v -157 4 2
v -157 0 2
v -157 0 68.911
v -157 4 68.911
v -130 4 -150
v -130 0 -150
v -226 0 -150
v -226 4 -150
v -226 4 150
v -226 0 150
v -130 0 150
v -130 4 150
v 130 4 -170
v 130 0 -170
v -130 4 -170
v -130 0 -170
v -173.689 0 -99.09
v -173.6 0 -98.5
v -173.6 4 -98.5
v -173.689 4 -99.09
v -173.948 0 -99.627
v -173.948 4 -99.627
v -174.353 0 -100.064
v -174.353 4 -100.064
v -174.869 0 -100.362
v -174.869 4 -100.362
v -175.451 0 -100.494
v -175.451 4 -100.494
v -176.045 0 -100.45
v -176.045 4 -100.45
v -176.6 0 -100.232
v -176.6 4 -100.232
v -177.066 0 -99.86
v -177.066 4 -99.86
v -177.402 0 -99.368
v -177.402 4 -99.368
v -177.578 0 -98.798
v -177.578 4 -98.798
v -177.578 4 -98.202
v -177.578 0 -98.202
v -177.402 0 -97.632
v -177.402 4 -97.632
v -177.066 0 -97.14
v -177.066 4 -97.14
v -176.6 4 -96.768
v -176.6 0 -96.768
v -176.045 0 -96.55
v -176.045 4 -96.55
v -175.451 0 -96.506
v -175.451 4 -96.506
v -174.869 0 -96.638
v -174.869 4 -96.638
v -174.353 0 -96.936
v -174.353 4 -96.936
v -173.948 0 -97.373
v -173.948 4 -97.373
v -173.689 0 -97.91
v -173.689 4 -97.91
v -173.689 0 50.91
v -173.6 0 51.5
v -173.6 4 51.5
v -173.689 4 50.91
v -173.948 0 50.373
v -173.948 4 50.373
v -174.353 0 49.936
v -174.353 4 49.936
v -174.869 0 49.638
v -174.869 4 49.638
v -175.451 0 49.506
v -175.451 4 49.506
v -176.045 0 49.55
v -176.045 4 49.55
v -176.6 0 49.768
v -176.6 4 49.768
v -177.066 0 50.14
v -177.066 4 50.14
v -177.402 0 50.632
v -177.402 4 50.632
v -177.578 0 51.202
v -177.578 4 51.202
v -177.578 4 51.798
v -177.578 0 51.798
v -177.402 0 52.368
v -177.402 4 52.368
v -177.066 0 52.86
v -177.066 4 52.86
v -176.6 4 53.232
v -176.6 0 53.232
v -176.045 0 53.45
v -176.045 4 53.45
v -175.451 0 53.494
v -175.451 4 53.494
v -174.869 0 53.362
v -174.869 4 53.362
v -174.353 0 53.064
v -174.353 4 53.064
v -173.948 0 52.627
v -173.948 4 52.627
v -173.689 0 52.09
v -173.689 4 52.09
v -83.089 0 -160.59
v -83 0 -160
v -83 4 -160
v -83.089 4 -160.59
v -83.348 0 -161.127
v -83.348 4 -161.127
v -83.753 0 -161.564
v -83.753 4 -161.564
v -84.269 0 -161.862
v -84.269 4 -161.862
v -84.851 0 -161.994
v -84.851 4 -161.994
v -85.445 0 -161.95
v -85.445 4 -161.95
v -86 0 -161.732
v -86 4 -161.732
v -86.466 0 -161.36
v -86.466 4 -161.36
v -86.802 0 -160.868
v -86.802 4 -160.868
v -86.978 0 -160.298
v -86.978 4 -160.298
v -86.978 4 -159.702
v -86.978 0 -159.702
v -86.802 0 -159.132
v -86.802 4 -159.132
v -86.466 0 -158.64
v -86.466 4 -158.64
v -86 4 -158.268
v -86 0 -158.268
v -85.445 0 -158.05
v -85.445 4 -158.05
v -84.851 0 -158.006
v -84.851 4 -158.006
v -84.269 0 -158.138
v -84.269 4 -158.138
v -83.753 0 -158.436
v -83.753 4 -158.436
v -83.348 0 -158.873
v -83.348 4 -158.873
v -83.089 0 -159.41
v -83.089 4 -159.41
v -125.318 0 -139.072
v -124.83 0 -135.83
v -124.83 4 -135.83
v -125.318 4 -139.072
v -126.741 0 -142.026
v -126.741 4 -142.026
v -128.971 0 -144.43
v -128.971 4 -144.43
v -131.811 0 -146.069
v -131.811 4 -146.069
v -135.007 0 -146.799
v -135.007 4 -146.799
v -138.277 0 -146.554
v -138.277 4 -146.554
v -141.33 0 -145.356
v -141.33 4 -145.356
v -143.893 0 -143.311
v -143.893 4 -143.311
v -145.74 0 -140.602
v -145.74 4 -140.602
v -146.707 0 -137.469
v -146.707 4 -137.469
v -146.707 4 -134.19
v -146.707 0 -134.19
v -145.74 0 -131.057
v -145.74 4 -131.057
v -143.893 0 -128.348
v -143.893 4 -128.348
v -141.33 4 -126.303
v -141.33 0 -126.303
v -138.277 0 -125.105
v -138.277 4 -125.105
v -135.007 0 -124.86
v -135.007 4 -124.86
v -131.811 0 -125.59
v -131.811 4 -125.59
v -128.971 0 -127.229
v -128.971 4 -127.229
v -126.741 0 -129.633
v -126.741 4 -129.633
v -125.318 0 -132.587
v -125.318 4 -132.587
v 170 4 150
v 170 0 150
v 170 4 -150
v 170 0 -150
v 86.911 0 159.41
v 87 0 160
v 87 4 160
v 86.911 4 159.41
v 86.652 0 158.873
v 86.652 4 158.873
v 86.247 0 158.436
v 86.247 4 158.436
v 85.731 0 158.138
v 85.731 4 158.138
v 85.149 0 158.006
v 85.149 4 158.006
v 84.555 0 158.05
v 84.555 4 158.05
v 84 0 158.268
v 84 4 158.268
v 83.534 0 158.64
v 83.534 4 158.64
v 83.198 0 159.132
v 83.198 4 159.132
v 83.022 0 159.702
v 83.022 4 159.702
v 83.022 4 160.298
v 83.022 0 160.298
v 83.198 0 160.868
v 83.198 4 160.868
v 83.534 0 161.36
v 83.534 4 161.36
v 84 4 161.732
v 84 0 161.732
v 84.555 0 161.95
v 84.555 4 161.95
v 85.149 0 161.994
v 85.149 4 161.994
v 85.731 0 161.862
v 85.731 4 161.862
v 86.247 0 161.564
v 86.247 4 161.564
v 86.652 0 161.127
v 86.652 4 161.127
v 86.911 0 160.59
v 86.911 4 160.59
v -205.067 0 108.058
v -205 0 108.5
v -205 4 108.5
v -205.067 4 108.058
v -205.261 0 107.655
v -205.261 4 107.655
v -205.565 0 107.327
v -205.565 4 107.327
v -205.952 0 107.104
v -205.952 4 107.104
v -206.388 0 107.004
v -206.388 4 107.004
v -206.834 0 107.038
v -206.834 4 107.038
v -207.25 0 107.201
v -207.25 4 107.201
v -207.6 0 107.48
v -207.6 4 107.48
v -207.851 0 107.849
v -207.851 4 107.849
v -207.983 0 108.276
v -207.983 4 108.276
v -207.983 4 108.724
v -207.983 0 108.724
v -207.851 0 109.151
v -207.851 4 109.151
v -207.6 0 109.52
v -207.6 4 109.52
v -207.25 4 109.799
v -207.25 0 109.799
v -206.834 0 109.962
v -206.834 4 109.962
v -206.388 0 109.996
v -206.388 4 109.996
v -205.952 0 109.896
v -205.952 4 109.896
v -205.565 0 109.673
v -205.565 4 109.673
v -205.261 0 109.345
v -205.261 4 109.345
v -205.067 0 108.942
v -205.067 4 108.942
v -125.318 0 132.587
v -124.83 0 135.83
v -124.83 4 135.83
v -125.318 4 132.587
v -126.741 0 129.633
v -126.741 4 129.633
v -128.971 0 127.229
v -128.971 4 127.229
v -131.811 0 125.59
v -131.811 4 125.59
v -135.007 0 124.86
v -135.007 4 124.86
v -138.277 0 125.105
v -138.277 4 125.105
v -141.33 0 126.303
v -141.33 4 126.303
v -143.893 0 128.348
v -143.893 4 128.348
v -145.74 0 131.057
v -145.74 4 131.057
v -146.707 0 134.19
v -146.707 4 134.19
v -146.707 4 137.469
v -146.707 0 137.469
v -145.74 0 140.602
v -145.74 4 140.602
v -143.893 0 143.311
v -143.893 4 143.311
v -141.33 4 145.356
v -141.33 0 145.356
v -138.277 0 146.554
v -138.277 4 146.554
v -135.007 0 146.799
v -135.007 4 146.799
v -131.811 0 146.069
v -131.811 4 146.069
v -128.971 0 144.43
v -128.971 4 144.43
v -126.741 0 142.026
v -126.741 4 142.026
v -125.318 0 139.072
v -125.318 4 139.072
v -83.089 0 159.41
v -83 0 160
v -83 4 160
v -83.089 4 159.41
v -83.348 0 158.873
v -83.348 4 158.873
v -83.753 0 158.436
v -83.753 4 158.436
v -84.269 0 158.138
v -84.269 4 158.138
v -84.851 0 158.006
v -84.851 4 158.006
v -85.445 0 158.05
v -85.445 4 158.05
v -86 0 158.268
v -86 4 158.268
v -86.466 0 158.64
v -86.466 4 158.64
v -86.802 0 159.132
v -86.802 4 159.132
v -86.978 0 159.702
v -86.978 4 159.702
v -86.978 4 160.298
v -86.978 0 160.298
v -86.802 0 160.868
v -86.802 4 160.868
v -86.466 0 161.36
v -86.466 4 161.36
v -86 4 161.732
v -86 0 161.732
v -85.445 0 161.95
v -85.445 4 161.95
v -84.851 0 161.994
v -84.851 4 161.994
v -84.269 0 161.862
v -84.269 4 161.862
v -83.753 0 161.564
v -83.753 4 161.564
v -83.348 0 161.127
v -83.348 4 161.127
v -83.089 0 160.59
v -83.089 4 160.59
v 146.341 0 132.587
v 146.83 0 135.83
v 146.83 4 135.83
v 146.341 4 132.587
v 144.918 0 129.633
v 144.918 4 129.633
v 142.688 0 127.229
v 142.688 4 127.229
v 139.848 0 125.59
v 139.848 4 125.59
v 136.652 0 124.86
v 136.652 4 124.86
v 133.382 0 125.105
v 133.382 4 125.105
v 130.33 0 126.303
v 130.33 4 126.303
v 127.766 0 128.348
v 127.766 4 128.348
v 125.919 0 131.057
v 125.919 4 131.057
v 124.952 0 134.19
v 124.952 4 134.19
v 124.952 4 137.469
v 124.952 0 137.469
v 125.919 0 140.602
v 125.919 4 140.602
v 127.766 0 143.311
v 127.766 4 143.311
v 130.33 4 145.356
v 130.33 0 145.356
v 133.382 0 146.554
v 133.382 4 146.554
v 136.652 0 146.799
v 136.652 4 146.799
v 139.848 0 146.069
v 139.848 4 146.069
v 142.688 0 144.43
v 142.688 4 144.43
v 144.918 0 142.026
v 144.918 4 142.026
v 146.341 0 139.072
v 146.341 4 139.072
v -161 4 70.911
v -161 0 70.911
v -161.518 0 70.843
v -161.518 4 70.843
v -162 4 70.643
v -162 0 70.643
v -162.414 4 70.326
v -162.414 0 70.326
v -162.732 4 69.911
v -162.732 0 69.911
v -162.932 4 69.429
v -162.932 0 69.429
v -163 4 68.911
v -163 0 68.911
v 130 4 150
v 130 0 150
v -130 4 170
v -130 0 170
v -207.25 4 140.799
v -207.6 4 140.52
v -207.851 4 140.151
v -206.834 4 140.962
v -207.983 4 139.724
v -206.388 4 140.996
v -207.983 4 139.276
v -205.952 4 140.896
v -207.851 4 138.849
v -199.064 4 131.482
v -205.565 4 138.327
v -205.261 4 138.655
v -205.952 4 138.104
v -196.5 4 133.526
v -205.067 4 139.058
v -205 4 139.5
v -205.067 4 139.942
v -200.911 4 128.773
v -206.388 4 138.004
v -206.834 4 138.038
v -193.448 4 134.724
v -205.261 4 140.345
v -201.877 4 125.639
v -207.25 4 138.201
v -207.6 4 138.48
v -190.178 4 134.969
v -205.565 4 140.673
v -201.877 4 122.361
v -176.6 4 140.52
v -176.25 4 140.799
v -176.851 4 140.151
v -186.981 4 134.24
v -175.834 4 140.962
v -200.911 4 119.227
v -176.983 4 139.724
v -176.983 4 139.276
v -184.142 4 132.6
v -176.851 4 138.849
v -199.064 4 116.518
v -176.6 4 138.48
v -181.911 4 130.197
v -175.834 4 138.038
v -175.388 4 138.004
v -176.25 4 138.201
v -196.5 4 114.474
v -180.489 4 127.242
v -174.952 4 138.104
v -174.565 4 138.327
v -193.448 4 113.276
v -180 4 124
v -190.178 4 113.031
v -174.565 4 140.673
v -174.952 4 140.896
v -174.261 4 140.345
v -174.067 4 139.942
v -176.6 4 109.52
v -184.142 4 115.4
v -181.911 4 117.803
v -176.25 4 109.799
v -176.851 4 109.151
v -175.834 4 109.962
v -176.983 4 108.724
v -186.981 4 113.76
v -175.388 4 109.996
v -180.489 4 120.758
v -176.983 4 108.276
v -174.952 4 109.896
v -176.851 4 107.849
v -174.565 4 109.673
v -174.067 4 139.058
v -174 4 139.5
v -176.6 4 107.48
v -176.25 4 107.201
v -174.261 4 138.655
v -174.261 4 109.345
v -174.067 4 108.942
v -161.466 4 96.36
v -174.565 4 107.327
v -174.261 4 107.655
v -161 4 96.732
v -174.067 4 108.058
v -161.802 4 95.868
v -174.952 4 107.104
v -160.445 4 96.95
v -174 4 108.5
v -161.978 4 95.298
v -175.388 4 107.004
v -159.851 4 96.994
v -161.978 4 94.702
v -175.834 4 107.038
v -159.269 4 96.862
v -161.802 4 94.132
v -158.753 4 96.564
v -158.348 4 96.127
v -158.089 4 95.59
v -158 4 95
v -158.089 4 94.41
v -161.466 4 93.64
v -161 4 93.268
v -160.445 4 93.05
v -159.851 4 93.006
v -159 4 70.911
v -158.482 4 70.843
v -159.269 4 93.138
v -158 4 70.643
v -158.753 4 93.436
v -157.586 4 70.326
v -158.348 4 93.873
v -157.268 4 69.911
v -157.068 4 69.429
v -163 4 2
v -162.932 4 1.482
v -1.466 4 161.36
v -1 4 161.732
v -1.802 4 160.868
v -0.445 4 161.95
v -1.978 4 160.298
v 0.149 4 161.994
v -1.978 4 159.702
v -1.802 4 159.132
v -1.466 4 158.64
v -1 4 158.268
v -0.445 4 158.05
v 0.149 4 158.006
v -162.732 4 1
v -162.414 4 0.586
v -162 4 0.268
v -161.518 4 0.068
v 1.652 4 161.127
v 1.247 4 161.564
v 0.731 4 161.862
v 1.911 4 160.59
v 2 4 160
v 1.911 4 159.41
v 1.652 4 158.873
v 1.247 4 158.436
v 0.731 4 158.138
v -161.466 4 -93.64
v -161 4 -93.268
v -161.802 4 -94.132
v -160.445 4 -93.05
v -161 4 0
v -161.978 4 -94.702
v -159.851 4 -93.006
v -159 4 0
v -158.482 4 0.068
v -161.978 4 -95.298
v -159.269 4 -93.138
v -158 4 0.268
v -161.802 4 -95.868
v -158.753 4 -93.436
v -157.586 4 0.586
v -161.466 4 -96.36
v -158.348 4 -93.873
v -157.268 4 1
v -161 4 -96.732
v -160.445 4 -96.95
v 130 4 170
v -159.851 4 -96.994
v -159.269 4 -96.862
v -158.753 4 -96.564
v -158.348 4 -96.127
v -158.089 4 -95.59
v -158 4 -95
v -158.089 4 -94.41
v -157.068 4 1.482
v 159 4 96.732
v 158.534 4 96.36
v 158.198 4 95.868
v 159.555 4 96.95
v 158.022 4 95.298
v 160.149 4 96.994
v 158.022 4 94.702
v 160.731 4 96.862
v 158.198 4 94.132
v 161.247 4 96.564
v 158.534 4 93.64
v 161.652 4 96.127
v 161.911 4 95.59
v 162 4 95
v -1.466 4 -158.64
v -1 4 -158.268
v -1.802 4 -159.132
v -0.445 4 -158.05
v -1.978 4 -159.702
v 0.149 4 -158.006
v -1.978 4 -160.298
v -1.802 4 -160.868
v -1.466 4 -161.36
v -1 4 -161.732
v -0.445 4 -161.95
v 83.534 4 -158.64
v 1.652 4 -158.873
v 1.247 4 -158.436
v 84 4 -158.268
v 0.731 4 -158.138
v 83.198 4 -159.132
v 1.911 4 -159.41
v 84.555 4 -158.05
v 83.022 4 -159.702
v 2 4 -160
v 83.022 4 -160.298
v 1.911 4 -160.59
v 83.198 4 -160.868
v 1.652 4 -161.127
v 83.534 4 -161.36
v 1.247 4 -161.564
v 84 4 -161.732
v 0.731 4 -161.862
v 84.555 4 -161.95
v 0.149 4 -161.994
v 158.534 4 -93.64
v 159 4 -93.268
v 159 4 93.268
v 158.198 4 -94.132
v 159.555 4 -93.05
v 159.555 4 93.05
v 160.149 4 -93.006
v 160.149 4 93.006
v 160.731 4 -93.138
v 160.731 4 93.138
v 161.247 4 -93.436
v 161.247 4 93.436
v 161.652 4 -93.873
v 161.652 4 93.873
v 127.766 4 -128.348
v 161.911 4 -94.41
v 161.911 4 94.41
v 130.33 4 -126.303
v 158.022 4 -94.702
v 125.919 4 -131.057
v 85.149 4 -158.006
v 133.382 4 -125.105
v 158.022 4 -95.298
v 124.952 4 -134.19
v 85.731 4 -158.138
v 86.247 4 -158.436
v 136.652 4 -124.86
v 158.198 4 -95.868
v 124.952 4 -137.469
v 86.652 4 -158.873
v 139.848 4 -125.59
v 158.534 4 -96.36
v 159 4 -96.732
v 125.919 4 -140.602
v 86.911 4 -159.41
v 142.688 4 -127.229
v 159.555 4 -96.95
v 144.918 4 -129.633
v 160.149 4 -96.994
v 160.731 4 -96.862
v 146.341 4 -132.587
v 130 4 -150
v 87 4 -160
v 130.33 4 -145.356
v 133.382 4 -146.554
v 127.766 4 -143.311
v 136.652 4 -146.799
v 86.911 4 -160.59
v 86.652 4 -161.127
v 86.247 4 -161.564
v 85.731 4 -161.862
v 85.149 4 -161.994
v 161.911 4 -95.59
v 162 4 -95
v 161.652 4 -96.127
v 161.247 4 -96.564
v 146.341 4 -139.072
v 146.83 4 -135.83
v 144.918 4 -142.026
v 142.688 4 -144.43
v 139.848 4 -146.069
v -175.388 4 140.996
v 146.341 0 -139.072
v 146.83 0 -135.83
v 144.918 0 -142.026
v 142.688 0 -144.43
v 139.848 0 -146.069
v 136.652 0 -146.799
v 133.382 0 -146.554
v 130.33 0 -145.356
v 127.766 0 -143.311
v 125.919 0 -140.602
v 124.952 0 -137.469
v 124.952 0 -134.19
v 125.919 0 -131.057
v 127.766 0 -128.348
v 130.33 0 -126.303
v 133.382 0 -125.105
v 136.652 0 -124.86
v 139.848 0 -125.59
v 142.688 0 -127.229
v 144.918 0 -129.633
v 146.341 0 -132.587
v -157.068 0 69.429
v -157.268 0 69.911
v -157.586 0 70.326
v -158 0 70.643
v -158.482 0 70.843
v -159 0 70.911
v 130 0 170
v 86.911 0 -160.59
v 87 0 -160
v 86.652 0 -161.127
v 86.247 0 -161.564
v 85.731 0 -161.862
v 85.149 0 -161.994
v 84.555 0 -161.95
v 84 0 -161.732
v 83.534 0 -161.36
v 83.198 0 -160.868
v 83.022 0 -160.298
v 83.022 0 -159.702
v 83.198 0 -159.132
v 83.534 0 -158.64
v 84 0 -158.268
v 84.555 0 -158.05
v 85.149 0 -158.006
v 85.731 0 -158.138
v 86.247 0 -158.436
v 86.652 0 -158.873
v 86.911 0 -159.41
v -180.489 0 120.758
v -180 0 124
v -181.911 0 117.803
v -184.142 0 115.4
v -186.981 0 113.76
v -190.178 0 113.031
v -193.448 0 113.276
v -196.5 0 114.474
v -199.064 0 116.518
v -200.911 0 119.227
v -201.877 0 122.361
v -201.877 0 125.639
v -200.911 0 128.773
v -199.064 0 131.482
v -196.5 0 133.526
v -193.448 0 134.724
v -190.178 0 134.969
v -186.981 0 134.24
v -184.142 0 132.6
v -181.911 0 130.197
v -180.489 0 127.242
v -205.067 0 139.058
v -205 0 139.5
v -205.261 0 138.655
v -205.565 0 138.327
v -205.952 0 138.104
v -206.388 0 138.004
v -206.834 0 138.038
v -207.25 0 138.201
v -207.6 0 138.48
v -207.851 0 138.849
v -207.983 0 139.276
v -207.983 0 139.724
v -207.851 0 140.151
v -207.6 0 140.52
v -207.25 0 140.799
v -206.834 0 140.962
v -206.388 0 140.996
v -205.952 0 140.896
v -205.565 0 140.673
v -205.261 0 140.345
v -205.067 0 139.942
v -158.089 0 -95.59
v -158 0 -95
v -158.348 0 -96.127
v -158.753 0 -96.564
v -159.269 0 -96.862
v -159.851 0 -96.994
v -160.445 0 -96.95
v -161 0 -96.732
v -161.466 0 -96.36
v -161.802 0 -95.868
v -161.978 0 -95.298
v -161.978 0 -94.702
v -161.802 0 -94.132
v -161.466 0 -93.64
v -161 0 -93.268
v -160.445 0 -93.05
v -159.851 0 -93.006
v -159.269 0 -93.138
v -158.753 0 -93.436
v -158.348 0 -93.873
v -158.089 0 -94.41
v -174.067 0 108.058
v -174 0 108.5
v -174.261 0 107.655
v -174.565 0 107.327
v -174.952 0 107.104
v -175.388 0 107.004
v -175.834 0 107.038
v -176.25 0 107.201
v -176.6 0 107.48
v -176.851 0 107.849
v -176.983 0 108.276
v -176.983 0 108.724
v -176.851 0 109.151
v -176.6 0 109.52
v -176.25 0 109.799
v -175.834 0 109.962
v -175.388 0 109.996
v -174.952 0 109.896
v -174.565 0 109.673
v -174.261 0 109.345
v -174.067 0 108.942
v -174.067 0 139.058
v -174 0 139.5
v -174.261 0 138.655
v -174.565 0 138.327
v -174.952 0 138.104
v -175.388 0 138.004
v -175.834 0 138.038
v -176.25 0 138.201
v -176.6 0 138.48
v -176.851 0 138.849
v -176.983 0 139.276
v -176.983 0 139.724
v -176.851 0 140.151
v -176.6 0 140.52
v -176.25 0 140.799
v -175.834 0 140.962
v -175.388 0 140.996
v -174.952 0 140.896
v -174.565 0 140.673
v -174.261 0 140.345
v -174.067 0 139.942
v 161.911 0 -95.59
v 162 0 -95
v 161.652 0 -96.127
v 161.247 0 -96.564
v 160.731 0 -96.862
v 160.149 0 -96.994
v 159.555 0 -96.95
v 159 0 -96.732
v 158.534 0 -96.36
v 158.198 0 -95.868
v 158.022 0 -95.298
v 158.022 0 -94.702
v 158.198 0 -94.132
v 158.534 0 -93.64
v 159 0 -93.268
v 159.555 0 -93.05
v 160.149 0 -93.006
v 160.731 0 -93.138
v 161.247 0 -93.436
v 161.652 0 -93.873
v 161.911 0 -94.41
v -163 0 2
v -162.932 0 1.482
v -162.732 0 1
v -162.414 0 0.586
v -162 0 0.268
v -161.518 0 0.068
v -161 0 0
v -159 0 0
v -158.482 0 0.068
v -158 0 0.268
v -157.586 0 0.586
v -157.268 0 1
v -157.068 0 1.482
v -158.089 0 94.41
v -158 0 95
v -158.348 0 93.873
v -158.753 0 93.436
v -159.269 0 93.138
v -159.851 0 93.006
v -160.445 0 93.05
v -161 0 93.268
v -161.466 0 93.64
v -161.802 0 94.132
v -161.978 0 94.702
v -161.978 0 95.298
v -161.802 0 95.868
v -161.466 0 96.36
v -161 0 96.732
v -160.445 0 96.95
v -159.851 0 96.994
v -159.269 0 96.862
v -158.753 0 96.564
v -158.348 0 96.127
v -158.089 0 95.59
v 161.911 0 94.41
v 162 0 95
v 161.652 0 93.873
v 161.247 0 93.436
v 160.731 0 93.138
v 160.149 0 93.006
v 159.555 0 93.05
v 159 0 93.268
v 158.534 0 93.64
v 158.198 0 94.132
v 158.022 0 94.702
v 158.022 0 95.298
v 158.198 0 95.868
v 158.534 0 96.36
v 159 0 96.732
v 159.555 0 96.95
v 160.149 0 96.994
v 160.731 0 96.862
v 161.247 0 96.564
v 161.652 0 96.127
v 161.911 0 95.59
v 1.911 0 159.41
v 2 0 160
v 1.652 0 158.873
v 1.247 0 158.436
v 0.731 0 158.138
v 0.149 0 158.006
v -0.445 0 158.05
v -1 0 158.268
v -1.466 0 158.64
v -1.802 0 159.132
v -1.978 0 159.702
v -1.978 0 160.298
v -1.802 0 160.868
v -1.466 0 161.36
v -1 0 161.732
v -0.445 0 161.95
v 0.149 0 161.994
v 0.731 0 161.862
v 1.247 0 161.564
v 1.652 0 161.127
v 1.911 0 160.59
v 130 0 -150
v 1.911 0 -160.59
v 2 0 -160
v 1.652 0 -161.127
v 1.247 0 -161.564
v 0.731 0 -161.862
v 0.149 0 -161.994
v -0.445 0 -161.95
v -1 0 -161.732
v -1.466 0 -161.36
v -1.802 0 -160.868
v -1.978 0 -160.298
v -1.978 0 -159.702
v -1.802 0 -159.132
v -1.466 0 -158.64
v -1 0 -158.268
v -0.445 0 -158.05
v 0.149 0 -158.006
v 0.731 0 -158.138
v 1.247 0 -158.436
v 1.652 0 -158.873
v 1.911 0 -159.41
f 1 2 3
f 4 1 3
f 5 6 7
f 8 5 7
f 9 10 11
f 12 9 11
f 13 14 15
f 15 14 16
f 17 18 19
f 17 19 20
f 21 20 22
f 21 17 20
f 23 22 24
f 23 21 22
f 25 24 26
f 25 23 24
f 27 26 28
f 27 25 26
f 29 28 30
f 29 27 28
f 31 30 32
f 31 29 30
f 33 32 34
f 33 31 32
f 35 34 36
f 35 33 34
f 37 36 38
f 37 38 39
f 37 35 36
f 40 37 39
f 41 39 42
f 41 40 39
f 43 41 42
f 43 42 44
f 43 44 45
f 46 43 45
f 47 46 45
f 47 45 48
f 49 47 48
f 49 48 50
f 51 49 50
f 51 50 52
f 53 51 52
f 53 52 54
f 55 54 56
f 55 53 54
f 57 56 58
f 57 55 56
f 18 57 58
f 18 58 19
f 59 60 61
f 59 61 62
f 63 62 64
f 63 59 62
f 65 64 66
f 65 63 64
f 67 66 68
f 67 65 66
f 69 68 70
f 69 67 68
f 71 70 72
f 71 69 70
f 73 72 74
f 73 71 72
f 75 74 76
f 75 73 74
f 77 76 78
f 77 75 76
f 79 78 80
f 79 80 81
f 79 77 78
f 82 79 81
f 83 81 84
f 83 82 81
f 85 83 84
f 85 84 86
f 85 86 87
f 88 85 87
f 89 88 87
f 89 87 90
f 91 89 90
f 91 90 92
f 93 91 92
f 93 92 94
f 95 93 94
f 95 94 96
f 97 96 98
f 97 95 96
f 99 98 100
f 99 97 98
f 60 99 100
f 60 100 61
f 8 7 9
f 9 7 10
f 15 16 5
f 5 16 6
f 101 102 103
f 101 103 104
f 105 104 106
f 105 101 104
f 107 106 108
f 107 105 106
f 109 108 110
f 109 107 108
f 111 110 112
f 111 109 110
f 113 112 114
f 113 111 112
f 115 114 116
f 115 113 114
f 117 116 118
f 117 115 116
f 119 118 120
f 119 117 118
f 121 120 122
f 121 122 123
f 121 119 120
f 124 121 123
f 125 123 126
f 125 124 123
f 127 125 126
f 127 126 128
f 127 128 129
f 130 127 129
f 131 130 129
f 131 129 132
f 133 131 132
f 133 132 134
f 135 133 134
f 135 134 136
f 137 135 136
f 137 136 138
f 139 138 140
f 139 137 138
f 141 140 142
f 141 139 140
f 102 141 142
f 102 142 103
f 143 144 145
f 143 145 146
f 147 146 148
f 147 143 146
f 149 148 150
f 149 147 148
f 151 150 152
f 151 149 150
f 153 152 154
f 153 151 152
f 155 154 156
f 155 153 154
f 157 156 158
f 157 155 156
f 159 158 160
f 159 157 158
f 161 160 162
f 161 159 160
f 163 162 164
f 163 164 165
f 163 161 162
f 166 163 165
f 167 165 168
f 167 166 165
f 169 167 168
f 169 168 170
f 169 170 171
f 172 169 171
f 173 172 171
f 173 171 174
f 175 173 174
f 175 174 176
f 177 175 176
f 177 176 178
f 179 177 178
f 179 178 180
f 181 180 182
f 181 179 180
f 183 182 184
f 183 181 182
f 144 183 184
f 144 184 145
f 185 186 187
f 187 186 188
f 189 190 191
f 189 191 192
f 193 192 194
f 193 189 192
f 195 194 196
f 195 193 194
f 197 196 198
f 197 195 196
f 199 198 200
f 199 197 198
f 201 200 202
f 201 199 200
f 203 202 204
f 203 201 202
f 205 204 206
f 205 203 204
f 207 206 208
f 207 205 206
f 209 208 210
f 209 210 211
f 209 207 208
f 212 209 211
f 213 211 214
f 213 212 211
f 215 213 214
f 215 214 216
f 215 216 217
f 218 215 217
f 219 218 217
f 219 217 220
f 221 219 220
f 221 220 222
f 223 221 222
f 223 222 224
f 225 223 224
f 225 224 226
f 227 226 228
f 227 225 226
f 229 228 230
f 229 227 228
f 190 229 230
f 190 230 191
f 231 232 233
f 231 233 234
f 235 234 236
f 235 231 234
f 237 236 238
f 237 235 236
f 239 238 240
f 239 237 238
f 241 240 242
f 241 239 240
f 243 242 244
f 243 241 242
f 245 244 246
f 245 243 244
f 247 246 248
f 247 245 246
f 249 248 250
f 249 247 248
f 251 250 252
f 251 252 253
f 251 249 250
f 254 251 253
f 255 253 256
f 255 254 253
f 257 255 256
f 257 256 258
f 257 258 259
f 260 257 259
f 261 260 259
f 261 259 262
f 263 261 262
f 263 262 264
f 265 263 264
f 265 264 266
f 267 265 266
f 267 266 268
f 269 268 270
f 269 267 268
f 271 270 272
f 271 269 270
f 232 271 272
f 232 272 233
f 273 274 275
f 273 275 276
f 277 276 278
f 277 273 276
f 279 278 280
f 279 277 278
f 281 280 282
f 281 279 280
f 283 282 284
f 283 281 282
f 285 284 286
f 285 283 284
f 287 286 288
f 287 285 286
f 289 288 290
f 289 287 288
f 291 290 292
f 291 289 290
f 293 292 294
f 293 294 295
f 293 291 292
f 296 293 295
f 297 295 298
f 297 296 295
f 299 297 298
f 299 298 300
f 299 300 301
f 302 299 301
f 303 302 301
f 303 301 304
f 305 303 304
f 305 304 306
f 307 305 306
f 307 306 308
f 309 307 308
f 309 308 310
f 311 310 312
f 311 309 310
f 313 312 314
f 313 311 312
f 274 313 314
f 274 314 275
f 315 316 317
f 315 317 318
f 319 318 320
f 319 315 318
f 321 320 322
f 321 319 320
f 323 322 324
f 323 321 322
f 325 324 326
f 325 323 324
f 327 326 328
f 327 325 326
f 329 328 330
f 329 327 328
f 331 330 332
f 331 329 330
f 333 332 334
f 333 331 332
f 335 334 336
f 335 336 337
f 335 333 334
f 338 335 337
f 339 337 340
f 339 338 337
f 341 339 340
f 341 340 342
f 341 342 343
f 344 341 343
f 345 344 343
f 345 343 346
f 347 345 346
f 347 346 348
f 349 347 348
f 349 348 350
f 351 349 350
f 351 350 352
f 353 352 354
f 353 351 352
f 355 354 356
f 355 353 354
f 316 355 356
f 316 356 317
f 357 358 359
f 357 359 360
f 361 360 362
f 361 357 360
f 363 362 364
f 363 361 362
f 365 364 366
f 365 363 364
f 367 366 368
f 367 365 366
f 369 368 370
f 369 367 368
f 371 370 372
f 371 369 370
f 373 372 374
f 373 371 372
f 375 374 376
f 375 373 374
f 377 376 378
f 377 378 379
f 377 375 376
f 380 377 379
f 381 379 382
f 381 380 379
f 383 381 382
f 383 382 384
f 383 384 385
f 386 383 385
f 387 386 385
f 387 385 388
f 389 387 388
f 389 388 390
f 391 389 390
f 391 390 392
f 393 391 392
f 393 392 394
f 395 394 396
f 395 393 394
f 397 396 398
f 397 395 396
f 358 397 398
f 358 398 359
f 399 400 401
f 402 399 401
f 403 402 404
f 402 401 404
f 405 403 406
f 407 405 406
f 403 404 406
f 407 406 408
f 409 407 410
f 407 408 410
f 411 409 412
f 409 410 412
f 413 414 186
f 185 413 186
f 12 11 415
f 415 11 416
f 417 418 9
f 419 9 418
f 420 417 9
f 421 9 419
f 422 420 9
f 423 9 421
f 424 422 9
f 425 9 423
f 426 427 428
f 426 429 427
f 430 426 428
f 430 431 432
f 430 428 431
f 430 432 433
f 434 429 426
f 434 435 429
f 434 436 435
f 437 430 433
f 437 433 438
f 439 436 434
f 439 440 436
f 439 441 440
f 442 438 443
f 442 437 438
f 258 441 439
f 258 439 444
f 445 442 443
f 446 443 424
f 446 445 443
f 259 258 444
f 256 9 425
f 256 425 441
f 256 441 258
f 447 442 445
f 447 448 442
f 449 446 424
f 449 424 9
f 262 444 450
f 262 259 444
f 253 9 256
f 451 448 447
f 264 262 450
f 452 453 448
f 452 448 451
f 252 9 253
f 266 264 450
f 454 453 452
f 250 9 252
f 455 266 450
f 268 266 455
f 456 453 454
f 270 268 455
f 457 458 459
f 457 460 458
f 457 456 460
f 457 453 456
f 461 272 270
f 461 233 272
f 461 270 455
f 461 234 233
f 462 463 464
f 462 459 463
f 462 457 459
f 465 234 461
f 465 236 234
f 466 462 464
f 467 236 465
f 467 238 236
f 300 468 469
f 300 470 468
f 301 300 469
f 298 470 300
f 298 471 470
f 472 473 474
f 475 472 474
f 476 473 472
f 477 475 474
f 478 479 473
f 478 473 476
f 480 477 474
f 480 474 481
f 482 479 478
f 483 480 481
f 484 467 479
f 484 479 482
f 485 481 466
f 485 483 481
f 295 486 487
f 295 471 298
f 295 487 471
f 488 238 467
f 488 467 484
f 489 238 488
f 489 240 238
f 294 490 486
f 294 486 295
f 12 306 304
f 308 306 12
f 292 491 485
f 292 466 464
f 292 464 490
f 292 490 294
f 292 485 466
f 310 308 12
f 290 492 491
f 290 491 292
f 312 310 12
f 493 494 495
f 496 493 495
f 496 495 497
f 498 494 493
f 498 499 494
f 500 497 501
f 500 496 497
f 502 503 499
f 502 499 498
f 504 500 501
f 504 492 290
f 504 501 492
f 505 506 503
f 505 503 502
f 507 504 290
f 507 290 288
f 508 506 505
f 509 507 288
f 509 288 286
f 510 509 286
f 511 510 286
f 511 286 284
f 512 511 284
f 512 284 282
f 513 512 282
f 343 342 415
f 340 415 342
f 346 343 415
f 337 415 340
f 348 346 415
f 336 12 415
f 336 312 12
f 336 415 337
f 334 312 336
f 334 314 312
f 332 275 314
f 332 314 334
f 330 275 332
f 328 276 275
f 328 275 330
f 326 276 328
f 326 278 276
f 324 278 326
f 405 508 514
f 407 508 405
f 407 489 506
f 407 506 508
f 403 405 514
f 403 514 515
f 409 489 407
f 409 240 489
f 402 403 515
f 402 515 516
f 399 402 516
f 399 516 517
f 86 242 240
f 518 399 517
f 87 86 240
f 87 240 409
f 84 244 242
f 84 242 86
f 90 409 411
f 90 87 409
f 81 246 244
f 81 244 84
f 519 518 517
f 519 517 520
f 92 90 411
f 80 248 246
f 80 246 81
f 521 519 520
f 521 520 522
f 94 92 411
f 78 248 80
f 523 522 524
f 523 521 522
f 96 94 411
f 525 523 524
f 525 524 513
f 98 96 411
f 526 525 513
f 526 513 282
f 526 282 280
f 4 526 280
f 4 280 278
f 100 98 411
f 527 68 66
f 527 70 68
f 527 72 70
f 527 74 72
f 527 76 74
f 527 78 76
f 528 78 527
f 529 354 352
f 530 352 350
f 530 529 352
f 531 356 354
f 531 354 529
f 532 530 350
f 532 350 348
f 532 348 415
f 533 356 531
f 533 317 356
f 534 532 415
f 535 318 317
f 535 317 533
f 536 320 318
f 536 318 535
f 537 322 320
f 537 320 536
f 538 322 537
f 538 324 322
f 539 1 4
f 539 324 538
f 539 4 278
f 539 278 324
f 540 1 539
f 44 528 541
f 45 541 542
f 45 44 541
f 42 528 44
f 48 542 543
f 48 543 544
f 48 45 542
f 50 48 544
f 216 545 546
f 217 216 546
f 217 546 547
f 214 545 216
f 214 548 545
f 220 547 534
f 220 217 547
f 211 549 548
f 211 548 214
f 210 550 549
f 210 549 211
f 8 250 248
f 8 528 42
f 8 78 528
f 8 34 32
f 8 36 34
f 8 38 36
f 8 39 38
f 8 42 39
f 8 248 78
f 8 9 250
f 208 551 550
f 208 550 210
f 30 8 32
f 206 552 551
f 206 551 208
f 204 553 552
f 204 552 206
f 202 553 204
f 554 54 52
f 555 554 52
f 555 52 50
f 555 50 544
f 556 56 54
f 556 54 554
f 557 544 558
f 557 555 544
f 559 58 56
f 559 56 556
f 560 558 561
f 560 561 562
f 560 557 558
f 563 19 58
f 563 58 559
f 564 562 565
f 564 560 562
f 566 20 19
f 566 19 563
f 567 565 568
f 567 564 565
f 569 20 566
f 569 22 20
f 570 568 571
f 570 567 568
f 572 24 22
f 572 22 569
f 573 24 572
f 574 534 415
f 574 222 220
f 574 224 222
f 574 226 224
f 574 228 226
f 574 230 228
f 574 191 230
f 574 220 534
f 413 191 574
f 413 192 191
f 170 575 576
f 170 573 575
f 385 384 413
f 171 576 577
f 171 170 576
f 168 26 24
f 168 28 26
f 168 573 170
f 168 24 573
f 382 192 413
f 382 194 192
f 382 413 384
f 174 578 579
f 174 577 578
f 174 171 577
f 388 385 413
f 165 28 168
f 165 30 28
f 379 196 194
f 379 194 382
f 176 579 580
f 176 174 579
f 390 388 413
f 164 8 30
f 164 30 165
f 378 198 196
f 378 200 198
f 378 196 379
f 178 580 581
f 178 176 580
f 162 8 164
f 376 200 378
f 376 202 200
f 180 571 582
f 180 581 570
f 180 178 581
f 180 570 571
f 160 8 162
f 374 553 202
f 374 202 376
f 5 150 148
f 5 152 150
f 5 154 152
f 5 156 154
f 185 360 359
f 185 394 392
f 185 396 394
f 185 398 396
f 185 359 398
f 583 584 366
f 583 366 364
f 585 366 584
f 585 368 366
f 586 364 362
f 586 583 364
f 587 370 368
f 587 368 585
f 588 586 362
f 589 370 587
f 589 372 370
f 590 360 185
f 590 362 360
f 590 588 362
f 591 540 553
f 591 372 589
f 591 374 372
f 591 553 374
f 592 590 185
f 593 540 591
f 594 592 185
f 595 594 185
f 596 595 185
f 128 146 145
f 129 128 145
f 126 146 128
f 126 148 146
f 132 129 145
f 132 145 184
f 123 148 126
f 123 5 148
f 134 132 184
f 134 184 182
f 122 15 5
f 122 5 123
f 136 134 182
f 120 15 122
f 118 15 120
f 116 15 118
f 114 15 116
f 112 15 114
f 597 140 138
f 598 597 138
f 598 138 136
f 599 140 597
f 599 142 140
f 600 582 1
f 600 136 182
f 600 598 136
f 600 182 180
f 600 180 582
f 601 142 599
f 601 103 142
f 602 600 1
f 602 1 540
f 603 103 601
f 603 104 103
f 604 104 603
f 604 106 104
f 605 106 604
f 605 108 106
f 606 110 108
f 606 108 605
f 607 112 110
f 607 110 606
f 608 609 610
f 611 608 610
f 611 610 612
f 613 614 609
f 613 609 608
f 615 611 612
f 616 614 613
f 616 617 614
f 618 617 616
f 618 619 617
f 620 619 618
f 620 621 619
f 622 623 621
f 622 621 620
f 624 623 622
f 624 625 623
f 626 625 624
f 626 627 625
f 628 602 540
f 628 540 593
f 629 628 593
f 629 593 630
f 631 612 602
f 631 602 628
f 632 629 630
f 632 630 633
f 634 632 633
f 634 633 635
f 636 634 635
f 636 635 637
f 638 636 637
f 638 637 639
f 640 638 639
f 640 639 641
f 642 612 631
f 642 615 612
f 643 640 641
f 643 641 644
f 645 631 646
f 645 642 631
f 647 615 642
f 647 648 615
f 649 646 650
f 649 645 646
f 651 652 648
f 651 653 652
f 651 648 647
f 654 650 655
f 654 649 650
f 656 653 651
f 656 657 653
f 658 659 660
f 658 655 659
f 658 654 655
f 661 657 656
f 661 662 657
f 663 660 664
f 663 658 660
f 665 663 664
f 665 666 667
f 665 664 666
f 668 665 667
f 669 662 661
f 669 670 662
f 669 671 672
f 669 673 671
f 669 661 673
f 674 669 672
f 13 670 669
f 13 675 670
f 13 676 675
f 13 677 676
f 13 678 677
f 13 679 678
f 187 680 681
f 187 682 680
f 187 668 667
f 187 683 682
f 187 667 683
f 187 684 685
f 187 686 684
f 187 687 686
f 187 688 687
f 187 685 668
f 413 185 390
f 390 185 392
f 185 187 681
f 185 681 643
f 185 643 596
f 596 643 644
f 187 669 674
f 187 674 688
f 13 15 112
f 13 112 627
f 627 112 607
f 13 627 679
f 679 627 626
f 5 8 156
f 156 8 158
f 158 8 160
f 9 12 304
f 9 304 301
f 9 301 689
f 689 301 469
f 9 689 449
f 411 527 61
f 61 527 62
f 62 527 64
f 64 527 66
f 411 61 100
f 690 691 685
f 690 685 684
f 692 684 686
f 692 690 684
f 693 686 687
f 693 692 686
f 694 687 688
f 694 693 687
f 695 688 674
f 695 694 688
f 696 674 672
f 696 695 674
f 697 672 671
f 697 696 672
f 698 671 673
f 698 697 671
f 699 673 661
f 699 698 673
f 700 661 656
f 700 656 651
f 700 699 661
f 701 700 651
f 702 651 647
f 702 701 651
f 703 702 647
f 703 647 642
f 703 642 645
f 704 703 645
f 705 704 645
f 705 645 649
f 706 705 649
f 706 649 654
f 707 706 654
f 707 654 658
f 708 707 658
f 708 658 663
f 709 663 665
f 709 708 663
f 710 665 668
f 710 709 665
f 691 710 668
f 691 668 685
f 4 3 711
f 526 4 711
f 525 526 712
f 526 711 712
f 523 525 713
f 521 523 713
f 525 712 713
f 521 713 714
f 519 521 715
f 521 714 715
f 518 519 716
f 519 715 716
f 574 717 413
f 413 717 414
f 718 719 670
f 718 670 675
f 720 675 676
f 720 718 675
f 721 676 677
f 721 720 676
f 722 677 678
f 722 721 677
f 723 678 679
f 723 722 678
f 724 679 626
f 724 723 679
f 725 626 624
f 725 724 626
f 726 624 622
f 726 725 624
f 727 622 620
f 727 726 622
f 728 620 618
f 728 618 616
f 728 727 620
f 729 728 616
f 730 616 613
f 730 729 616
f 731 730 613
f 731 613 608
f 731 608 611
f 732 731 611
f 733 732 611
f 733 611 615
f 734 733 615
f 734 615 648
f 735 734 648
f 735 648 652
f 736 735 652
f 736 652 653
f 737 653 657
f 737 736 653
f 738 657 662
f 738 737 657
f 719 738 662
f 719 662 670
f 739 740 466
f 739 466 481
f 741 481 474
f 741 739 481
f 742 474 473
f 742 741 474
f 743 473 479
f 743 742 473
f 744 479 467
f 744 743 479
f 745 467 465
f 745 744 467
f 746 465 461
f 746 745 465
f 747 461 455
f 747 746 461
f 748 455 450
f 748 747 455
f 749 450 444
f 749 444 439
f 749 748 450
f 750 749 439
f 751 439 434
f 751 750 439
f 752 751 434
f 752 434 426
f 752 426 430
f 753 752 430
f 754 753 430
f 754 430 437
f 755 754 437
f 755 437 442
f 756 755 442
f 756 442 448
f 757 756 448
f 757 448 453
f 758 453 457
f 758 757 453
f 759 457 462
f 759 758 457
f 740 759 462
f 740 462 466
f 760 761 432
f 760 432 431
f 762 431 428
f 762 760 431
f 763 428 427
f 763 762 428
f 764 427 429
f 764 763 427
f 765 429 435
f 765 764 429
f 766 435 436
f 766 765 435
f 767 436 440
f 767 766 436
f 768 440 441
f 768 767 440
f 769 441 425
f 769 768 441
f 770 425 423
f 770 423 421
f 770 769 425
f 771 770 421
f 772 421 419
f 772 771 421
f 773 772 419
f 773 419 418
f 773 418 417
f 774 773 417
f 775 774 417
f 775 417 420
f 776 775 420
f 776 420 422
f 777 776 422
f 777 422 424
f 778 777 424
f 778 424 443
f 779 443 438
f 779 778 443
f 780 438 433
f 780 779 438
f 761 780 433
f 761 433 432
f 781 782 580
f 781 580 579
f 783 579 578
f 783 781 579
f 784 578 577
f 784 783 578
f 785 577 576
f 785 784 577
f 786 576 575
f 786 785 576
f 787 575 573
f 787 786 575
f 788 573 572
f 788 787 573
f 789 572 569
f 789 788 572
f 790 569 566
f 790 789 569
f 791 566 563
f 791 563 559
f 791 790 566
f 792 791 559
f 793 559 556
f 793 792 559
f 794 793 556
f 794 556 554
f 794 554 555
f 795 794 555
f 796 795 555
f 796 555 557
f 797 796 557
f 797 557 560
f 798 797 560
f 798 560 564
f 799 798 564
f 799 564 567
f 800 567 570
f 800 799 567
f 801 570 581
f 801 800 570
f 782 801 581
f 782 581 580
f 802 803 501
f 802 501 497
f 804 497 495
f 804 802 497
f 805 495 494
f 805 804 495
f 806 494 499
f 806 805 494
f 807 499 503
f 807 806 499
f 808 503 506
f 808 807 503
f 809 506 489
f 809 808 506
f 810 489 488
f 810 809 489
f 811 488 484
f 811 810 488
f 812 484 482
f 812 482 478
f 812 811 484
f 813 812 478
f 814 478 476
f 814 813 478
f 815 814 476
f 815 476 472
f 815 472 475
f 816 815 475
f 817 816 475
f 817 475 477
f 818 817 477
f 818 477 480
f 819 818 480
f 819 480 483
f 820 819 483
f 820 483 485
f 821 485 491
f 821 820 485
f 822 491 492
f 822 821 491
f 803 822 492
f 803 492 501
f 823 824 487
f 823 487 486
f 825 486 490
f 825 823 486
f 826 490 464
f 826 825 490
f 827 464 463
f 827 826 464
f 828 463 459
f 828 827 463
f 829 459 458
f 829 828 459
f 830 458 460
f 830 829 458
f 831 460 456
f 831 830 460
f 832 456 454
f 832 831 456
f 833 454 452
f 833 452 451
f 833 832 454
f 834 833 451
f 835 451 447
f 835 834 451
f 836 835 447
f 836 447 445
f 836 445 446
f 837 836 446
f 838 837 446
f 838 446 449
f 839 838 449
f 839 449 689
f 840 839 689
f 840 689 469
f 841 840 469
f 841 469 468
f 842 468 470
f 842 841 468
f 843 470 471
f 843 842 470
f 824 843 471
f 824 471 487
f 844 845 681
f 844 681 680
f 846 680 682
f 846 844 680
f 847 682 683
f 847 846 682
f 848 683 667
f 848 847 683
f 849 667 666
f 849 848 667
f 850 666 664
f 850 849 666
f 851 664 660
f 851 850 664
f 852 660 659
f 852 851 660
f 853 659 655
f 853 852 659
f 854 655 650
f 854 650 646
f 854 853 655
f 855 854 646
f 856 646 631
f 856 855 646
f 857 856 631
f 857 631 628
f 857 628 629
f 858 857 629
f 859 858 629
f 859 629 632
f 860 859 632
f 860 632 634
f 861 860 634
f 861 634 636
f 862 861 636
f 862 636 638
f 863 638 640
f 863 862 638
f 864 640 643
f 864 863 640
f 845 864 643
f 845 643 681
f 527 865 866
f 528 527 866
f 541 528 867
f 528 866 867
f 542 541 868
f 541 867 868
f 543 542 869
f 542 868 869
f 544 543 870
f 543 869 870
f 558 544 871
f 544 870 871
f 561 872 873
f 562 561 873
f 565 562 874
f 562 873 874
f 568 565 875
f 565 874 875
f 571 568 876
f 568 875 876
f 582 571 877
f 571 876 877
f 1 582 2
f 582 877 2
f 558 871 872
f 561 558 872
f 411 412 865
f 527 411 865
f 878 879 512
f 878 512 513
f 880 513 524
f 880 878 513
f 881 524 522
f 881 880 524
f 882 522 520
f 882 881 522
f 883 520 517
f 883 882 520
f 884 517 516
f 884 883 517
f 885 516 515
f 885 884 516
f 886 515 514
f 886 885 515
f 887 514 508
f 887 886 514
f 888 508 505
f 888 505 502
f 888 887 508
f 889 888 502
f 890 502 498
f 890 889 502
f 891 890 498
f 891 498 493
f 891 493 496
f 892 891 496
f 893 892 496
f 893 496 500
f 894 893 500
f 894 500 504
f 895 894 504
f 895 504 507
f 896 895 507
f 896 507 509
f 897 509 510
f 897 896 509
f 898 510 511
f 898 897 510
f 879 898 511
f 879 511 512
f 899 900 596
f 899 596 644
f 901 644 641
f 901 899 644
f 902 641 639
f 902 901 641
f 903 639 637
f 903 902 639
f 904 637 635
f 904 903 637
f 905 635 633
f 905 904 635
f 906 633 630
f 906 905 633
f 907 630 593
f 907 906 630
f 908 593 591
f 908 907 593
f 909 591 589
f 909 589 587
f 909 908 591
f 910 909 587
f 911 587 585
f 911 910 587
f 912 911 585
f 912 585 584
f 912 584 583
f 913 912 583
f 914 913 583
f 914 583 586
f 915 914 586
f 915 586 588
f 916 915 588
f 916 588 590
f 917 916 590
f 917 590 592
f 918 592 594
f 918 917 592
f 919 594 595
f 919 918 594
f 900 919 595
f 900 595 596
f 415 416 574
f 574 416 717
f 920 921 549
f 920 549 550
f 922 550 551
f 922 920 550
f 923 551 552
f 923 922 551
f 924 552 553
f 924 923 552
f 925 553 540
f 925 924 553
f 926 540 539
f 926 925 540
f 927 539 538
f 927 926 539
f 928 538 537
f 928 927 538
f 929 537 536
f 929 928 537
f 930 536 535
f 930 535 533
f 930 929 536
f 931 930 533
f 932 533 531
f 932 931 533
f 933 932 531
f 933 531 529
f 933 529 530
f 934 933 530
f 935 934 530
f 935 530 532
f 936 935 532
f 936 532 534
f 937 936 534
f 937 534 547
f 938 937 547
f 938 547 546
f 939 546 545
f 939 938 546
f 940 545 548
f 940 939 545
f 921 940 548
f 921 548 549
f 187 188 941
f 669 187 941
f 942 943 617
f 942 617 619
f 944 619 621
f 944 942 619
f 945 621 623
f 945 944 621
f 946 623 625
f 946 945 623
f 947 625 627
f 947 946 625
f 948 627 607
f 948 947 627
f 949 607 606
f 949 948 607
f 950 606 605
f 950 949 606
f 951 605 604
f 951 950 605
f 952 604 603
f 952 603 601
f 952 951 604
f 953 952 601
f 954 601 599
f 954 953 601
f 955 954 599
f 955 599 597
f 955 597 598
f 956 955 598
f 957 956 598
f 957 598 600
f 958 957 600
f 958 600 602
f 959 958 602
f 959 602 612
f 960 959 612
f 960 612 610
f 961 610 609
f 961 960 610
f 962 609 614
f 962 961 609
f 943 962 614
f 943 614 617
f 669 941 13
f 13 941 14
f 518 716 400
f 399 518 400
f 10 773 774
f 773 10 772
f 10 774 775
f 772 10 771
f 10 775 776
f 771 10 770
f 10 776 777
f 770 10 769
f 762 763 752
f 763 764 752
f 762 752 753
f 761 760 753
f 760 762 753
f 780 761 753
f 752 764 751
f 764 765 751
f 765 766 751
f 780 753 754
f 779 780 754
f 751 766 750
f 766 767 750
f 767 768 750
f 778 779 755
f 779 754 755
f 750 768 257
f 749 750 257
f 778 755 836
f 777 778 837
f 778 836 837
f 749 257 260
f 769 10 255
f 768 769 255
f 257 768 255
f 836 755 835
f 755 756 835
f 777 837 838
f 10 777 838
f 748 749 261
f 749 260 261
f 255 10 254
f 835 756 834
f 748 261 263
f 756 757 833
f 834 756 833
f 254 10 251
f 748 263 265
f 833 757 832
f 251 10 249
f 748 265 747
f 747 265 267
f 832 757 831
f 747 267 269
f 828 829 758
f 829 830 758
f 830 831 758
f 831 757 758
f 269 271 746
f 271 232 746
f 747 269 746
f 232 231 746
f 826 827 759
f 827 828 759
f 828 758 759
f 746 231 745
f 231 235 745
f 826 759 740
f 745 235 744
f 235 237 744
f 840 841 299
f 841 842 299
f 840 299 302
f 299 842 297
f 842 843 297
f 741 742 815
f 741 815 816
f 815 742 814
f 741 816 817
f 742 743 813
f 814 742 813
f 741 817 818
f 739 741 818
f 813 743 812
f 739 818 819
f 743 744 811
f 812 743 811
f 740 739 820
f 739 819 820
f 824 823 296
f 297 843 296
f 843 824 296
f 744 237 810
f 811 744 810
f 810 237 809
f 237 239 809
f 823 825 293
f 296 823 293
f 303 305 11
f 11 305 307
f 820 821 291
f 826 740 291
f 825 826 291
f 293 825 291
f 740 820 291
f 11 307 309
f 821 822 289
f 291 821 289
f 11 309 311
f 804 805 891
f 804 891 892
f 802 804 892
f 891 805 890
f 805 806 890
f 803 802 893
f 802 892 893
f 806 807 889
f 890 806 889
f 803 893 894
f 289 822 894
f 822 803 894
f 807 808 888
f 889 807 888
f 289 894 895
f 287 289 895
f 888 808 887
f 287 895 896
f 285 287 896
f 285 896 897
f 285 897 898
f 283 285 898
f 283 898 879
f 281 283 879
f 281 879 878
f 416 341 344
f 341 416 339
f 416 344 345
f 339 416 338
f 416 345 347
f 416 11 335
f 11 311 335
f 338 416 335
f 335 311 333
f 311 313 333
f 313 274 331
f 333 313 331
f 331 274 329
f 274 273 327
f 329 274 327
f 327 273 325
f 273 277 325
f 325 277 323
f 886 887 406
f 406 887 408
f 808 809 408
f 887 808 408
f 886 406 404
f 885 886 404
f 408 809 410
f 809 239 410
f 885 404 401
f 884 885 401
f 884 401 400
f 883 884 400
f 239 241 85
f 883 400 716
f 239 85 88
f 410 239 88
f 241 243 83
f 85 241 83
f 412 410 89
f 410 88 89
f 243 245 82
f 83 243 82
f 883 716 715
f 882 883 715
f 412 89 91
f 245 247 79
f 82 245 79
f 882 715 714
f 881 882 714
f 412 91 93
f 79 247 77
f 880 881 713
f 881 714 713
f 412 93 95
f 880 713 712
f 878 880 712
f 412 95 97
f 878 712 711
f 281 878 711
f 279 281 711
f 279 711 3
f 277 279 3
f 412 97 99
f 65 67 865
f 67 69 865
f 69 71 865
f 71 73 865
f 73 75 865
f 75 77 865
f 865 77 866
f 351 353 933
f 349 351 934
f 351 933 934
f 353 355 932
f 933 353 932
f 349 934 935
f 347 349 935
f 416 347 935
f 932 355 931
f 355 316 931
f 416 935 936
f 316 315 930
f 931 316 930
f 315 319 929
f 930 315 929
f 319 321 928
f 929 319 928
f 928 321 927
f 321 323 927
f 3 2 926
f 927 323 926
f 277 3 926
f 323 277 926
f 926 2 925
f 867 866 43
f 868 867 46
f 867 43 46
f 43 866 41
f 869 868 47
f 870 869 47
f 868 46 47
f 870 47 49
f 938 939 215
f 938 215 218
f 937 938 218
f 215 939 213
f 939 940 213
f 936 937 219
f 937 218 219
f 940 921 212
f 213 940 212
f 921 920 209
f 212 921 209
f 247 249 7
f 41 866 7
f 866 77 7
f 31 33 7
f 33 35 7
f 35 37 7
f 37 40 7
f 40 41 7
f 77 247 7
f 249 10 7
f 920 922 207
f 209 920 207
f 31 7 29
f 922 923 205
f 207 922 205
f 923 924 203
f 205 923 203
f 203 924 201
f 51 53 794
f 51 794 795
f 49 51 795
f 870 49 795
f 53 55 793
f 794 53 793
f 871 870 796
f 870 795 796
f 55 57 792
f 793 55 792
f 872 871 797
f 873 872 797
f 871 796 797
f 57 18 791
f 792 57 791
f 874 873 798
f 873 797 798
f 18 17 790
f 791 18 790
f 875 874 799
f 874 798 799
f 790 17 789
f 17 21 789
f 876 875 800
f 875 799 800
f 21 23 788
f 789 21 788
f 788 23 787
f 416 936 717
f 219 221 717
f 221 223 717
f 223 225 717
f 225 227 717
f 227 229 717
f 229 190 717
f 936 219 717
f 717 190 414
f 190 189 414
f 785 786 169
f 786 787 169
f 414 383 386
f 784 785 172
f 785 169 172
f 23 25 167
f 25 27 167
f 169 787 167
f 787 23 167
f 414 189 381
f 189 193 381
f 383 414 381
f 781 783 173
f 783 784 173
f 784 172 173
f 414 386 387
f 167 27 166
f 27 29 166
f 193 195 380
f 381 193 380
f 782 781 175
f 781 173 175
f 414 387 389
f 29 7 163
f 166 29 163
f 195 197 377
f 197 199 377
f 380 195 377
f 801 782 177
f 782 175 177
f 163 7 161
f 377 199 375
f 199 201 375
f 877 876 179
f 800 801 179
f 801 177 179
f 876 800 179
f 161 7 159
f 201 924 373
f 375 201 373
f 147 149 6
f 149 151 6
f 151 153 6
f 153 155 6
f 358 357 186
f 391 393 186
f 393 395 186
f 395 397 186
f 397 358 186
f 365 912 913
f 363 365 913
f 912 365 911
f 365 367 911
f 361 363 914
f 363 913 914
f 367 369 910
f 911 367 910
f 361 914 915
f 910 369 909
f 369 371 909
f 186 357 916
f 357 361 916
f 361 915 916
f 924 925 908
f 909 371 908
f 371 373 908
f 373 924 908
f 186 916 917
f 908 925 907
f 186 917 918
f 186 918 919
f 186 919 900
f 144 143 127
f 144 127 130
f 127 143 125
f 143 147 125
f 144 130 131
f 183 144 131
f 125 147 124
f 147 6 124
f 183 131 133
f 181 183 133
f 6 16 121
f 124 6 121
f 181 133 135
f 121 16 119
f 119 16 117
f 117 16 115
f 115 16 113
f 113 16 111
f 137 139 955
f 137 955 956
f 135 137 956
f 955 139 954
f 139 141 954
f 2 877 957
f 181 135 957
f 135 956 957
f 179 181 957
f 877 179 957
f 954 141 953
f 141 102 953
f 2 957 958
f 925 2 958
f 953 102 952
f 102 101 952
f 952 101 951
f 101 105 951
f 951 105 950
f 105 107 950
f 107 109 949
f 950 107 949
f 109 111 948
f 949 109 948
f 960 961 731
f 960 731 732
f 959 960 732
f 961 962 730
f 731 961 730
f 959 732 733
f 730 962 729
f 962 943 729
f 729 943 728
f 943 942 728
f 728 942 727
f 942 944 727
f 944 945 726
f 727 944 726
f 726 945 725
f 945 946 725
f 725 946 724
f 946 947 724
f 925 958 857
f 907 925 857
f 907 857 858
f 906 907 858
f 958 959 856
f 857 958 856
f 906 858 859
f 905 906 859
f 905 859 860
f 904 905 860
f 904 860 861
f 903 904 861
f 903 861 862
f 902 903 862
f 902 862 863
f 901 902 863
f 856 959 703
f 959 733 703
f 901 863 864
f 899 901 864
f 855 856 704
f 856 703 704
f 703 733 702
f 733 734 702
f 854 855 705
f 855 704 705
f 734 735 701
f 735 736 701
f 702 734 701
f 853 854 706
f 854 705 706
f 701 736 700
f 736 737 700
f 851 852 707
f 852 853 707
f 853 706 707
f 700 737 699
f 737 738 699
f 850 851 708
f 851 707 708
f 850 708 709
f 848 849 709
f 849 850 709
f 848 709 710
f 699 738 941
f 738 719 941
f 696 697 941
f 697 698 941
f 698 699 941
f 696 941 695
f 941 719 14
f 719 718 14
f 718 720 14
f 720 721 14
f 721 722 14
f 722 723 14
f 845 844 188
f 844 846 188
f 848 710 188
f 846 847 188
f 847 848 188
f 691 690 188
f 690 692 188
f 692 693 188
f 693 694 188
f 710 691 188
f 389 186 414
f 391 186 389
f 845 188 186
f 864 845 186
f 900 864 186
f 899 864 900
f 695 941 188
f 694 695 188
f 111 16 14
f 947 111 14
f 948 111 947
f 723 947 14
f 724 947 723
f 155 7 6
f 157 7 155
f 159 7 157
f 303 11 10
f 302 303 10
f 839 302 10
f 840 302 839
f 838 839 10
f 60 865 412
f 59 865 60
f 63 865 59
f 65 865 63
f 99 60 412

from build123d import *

# Parameters (mm, degrees)
SKETCH1_4_R         = 11
SKETCH1_4_R_2       = 2
SKETCH1_4_R_3       = 1.5
BOSS_EXTRUDE3_DEPTH = 4


with BuildPart() as part:
    # Sketch1_4 → Boss-Extrude3 (new body)
    with BuildSketch(Plane(origin=(0, 0, 0), x_dir=(1, 0, 0), z_dir=(0, 1, 0))):
        Polygon((130, -150), (170, -150), (170, 150), (130, 150), (130, 170), (-130, 170), (-130, 150), (-226, 150), (-226, -150), (-130, -150), (-130, -170), (130, -170), align=None)
        with Locations((135.829506597, -135.829506597)):
            Circle(SKETCH1_4_R, mode=Mode.SUBTRACT)
        with Locations((160, -95)):
            Circle(SKETCH1_4_R_2, mode=Mode.SUBTRACT)
        with Locations((160, 95)):
            Circle(SKETCH1_4_R_2, mode=Mode.SUBTRACT)
        with Locations((135.829506597, 135.829506597)):
            Circle(SKETCH1_4_R, mode=Mode.SUBTRACT)
        with Locations((85, -160)):
            Circle(SKETCH1_4_R_2, mode=Mode.SUBTRACT)
        with Locations((-85, -160)):
            Circle(SKETCH1_4_R_2, mode=Mode.SUBTRACT)
        with Locations((0, -160)):
            Circle(SKETCH1_4_R_2, mode=Mode.SUBTRACT)
        with Locations((85, 160)):
            Circle(SKETCH1_4_R_2, mode=Mode.SUBTRACT)
        with Locations((-85, 160)):
            Circle(SKETCH1_4_R_2, mode=Mode.SUBTRACT)
        with Locations((0, 160)):
            Circle(SKETCH1_4_R_2, mode=Mode.SUBTRACT)
        with BuildLine():
            Line((-161, 0), (-159, 0))
            ThreePointArc((-159, 0), (-157.585786438, -0.585786438), (-157, -2))
            Line((-157, -2), (-157, -68.911348687))
            ThreePointArc((-157, -68.911348687), (-157.585786438, -70.325562249), (-159, -70.911348687))
            Line((-159, -70.911348687), (-161, -70.911348687))
            ThreePointArc((-161, -70.911348687), (-162.414213562, -70.325562249), (-163, -68.911348687))
            Line((-163, -68.911348687), (-163, -2))
            ThreePointArc((-163, -2), (-162.414213562, -0.585786438), (-161, 0))
        make_face(mode=Mode.SUBTRACT)
        with Locations((-135.829506597, 135.829506597)):
            Circle(SKETCH1_4_R, mode=Mode.SUBTRACT)
        with Locations((-160, 95)):
            Circle(SKETCH1_4_R_2, mode=Mode.SUBTRACT)
        with Locations((-135.829506597, -135.829506597)):
            Circle(SKETCH1_4_R, mode=Mode.SUBTRACT)
        with Locations((-160, -95)):
            Circle(SKETCH1_4_R_2, mode=Mode.SUBTRACT)
        with Locations((-206.5, -139.5)):
            Circle(SKETCH1_4_R_3, mode=Mode.SUBTRACT)
        with Locations((-175.5, -139.5)):
            Circle(SKETCH1_4_R_3, mode=Mode.SUBTRACT)
        with Locations((-206.5, -108.5)):
            Circle(SKETCH1_4_R_3, mode=Mode.SUBTRACT)
        with Locations((-191, -124)):
            Circle(SKETCH1_4_R, mode=Mode.SUBTRACT)
        with Locations((-175.5, -108.5)):
            Circle(SKETCH1_4_R_3, mode=Mode.SUBTRACT)
        with Locations((-175.6, -51.5)):
            Circle(SKETCH1_4_R_2, mode=Mode.SUBTRACT)
        with Locations((-175.6, 98.5)):
            Circle(SKETCH1_4_R_2, mode=Mode.SUBTRACT)
    extrude(amount=BOSS_EXTRUDE3_DEPTH)


solid = part.part
